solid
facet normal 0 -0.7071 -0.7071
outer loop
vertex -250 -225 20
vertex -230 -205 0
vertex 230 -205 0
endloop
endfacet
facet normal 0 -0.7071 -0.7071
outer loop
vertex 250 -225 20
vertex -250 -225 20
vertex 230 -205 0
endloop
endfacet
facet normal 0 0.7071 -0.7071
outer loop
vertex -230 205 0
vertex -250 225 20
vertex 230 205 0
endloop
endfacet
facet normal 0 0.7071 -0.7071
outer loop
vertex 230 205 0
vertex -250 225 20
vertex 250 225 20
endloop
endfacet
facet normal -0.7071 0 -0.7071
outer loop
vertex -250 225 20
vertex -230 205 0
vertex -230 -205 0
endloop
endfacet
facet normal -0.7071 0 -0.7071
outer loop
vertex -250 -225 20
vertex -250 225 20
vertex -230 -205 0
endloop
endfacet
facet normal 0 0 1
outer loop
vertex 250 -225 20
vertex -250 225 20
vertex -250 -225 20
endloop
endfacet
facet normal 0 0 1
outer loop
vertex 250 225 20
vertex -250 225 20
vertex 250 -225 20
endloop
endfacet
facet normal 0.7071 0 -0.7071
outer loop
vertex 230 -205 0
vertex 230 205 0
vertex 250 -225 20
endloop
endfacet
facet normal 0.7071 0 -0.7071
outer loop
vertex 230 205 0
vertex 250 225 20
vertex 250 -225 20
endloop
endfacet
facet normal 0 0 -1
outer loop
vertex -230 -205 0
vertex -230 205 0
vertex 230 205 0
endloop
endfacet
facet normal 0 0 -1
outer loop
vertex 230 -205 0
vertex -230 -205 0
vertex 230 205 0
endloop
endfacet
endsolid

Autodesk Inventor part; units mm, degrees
ref_plane "YZ Plane" through (0, 0, 0) normal (1, 0, 0) x (0, 1, 0)
ref_plane "XZ Plane" through (0, 0, 0) normal (0, 1, 0) x (-1, 0, 0)
ref_plane "XY Plane" through (0, 0, 0) normal (0, 0, 1) x (1, 0, 0)
sketch "Skizze1" plane through (0, 0, 0) normal (0, 0, 1) x (1, 0, 0)
  line L0 (0, -315) -> (0, 315) projected
  line L1 (-350, 0) -> (350, 0) projected
  line L2 (-250, 225) -> (250, 225)
  line L3 (250, 225) -> (250, -225)
  line L4 (250, -225) -> (-250, -225)
  line L5 (-250, -225) -> (-250, 225)
  point P0 (0, 0)
  dimension "d0" = 500
  dimension "d1" = 450
extrude "Extrusion1" add sketch "Skizze1" along normal blind 20
chamfer "Fase1" distance 20 angle 45 4 edges at (-250, 0, 0) (0, 225, 0) (250, 0, 0) (0, -225, 0)
properties part number "Wand1"
